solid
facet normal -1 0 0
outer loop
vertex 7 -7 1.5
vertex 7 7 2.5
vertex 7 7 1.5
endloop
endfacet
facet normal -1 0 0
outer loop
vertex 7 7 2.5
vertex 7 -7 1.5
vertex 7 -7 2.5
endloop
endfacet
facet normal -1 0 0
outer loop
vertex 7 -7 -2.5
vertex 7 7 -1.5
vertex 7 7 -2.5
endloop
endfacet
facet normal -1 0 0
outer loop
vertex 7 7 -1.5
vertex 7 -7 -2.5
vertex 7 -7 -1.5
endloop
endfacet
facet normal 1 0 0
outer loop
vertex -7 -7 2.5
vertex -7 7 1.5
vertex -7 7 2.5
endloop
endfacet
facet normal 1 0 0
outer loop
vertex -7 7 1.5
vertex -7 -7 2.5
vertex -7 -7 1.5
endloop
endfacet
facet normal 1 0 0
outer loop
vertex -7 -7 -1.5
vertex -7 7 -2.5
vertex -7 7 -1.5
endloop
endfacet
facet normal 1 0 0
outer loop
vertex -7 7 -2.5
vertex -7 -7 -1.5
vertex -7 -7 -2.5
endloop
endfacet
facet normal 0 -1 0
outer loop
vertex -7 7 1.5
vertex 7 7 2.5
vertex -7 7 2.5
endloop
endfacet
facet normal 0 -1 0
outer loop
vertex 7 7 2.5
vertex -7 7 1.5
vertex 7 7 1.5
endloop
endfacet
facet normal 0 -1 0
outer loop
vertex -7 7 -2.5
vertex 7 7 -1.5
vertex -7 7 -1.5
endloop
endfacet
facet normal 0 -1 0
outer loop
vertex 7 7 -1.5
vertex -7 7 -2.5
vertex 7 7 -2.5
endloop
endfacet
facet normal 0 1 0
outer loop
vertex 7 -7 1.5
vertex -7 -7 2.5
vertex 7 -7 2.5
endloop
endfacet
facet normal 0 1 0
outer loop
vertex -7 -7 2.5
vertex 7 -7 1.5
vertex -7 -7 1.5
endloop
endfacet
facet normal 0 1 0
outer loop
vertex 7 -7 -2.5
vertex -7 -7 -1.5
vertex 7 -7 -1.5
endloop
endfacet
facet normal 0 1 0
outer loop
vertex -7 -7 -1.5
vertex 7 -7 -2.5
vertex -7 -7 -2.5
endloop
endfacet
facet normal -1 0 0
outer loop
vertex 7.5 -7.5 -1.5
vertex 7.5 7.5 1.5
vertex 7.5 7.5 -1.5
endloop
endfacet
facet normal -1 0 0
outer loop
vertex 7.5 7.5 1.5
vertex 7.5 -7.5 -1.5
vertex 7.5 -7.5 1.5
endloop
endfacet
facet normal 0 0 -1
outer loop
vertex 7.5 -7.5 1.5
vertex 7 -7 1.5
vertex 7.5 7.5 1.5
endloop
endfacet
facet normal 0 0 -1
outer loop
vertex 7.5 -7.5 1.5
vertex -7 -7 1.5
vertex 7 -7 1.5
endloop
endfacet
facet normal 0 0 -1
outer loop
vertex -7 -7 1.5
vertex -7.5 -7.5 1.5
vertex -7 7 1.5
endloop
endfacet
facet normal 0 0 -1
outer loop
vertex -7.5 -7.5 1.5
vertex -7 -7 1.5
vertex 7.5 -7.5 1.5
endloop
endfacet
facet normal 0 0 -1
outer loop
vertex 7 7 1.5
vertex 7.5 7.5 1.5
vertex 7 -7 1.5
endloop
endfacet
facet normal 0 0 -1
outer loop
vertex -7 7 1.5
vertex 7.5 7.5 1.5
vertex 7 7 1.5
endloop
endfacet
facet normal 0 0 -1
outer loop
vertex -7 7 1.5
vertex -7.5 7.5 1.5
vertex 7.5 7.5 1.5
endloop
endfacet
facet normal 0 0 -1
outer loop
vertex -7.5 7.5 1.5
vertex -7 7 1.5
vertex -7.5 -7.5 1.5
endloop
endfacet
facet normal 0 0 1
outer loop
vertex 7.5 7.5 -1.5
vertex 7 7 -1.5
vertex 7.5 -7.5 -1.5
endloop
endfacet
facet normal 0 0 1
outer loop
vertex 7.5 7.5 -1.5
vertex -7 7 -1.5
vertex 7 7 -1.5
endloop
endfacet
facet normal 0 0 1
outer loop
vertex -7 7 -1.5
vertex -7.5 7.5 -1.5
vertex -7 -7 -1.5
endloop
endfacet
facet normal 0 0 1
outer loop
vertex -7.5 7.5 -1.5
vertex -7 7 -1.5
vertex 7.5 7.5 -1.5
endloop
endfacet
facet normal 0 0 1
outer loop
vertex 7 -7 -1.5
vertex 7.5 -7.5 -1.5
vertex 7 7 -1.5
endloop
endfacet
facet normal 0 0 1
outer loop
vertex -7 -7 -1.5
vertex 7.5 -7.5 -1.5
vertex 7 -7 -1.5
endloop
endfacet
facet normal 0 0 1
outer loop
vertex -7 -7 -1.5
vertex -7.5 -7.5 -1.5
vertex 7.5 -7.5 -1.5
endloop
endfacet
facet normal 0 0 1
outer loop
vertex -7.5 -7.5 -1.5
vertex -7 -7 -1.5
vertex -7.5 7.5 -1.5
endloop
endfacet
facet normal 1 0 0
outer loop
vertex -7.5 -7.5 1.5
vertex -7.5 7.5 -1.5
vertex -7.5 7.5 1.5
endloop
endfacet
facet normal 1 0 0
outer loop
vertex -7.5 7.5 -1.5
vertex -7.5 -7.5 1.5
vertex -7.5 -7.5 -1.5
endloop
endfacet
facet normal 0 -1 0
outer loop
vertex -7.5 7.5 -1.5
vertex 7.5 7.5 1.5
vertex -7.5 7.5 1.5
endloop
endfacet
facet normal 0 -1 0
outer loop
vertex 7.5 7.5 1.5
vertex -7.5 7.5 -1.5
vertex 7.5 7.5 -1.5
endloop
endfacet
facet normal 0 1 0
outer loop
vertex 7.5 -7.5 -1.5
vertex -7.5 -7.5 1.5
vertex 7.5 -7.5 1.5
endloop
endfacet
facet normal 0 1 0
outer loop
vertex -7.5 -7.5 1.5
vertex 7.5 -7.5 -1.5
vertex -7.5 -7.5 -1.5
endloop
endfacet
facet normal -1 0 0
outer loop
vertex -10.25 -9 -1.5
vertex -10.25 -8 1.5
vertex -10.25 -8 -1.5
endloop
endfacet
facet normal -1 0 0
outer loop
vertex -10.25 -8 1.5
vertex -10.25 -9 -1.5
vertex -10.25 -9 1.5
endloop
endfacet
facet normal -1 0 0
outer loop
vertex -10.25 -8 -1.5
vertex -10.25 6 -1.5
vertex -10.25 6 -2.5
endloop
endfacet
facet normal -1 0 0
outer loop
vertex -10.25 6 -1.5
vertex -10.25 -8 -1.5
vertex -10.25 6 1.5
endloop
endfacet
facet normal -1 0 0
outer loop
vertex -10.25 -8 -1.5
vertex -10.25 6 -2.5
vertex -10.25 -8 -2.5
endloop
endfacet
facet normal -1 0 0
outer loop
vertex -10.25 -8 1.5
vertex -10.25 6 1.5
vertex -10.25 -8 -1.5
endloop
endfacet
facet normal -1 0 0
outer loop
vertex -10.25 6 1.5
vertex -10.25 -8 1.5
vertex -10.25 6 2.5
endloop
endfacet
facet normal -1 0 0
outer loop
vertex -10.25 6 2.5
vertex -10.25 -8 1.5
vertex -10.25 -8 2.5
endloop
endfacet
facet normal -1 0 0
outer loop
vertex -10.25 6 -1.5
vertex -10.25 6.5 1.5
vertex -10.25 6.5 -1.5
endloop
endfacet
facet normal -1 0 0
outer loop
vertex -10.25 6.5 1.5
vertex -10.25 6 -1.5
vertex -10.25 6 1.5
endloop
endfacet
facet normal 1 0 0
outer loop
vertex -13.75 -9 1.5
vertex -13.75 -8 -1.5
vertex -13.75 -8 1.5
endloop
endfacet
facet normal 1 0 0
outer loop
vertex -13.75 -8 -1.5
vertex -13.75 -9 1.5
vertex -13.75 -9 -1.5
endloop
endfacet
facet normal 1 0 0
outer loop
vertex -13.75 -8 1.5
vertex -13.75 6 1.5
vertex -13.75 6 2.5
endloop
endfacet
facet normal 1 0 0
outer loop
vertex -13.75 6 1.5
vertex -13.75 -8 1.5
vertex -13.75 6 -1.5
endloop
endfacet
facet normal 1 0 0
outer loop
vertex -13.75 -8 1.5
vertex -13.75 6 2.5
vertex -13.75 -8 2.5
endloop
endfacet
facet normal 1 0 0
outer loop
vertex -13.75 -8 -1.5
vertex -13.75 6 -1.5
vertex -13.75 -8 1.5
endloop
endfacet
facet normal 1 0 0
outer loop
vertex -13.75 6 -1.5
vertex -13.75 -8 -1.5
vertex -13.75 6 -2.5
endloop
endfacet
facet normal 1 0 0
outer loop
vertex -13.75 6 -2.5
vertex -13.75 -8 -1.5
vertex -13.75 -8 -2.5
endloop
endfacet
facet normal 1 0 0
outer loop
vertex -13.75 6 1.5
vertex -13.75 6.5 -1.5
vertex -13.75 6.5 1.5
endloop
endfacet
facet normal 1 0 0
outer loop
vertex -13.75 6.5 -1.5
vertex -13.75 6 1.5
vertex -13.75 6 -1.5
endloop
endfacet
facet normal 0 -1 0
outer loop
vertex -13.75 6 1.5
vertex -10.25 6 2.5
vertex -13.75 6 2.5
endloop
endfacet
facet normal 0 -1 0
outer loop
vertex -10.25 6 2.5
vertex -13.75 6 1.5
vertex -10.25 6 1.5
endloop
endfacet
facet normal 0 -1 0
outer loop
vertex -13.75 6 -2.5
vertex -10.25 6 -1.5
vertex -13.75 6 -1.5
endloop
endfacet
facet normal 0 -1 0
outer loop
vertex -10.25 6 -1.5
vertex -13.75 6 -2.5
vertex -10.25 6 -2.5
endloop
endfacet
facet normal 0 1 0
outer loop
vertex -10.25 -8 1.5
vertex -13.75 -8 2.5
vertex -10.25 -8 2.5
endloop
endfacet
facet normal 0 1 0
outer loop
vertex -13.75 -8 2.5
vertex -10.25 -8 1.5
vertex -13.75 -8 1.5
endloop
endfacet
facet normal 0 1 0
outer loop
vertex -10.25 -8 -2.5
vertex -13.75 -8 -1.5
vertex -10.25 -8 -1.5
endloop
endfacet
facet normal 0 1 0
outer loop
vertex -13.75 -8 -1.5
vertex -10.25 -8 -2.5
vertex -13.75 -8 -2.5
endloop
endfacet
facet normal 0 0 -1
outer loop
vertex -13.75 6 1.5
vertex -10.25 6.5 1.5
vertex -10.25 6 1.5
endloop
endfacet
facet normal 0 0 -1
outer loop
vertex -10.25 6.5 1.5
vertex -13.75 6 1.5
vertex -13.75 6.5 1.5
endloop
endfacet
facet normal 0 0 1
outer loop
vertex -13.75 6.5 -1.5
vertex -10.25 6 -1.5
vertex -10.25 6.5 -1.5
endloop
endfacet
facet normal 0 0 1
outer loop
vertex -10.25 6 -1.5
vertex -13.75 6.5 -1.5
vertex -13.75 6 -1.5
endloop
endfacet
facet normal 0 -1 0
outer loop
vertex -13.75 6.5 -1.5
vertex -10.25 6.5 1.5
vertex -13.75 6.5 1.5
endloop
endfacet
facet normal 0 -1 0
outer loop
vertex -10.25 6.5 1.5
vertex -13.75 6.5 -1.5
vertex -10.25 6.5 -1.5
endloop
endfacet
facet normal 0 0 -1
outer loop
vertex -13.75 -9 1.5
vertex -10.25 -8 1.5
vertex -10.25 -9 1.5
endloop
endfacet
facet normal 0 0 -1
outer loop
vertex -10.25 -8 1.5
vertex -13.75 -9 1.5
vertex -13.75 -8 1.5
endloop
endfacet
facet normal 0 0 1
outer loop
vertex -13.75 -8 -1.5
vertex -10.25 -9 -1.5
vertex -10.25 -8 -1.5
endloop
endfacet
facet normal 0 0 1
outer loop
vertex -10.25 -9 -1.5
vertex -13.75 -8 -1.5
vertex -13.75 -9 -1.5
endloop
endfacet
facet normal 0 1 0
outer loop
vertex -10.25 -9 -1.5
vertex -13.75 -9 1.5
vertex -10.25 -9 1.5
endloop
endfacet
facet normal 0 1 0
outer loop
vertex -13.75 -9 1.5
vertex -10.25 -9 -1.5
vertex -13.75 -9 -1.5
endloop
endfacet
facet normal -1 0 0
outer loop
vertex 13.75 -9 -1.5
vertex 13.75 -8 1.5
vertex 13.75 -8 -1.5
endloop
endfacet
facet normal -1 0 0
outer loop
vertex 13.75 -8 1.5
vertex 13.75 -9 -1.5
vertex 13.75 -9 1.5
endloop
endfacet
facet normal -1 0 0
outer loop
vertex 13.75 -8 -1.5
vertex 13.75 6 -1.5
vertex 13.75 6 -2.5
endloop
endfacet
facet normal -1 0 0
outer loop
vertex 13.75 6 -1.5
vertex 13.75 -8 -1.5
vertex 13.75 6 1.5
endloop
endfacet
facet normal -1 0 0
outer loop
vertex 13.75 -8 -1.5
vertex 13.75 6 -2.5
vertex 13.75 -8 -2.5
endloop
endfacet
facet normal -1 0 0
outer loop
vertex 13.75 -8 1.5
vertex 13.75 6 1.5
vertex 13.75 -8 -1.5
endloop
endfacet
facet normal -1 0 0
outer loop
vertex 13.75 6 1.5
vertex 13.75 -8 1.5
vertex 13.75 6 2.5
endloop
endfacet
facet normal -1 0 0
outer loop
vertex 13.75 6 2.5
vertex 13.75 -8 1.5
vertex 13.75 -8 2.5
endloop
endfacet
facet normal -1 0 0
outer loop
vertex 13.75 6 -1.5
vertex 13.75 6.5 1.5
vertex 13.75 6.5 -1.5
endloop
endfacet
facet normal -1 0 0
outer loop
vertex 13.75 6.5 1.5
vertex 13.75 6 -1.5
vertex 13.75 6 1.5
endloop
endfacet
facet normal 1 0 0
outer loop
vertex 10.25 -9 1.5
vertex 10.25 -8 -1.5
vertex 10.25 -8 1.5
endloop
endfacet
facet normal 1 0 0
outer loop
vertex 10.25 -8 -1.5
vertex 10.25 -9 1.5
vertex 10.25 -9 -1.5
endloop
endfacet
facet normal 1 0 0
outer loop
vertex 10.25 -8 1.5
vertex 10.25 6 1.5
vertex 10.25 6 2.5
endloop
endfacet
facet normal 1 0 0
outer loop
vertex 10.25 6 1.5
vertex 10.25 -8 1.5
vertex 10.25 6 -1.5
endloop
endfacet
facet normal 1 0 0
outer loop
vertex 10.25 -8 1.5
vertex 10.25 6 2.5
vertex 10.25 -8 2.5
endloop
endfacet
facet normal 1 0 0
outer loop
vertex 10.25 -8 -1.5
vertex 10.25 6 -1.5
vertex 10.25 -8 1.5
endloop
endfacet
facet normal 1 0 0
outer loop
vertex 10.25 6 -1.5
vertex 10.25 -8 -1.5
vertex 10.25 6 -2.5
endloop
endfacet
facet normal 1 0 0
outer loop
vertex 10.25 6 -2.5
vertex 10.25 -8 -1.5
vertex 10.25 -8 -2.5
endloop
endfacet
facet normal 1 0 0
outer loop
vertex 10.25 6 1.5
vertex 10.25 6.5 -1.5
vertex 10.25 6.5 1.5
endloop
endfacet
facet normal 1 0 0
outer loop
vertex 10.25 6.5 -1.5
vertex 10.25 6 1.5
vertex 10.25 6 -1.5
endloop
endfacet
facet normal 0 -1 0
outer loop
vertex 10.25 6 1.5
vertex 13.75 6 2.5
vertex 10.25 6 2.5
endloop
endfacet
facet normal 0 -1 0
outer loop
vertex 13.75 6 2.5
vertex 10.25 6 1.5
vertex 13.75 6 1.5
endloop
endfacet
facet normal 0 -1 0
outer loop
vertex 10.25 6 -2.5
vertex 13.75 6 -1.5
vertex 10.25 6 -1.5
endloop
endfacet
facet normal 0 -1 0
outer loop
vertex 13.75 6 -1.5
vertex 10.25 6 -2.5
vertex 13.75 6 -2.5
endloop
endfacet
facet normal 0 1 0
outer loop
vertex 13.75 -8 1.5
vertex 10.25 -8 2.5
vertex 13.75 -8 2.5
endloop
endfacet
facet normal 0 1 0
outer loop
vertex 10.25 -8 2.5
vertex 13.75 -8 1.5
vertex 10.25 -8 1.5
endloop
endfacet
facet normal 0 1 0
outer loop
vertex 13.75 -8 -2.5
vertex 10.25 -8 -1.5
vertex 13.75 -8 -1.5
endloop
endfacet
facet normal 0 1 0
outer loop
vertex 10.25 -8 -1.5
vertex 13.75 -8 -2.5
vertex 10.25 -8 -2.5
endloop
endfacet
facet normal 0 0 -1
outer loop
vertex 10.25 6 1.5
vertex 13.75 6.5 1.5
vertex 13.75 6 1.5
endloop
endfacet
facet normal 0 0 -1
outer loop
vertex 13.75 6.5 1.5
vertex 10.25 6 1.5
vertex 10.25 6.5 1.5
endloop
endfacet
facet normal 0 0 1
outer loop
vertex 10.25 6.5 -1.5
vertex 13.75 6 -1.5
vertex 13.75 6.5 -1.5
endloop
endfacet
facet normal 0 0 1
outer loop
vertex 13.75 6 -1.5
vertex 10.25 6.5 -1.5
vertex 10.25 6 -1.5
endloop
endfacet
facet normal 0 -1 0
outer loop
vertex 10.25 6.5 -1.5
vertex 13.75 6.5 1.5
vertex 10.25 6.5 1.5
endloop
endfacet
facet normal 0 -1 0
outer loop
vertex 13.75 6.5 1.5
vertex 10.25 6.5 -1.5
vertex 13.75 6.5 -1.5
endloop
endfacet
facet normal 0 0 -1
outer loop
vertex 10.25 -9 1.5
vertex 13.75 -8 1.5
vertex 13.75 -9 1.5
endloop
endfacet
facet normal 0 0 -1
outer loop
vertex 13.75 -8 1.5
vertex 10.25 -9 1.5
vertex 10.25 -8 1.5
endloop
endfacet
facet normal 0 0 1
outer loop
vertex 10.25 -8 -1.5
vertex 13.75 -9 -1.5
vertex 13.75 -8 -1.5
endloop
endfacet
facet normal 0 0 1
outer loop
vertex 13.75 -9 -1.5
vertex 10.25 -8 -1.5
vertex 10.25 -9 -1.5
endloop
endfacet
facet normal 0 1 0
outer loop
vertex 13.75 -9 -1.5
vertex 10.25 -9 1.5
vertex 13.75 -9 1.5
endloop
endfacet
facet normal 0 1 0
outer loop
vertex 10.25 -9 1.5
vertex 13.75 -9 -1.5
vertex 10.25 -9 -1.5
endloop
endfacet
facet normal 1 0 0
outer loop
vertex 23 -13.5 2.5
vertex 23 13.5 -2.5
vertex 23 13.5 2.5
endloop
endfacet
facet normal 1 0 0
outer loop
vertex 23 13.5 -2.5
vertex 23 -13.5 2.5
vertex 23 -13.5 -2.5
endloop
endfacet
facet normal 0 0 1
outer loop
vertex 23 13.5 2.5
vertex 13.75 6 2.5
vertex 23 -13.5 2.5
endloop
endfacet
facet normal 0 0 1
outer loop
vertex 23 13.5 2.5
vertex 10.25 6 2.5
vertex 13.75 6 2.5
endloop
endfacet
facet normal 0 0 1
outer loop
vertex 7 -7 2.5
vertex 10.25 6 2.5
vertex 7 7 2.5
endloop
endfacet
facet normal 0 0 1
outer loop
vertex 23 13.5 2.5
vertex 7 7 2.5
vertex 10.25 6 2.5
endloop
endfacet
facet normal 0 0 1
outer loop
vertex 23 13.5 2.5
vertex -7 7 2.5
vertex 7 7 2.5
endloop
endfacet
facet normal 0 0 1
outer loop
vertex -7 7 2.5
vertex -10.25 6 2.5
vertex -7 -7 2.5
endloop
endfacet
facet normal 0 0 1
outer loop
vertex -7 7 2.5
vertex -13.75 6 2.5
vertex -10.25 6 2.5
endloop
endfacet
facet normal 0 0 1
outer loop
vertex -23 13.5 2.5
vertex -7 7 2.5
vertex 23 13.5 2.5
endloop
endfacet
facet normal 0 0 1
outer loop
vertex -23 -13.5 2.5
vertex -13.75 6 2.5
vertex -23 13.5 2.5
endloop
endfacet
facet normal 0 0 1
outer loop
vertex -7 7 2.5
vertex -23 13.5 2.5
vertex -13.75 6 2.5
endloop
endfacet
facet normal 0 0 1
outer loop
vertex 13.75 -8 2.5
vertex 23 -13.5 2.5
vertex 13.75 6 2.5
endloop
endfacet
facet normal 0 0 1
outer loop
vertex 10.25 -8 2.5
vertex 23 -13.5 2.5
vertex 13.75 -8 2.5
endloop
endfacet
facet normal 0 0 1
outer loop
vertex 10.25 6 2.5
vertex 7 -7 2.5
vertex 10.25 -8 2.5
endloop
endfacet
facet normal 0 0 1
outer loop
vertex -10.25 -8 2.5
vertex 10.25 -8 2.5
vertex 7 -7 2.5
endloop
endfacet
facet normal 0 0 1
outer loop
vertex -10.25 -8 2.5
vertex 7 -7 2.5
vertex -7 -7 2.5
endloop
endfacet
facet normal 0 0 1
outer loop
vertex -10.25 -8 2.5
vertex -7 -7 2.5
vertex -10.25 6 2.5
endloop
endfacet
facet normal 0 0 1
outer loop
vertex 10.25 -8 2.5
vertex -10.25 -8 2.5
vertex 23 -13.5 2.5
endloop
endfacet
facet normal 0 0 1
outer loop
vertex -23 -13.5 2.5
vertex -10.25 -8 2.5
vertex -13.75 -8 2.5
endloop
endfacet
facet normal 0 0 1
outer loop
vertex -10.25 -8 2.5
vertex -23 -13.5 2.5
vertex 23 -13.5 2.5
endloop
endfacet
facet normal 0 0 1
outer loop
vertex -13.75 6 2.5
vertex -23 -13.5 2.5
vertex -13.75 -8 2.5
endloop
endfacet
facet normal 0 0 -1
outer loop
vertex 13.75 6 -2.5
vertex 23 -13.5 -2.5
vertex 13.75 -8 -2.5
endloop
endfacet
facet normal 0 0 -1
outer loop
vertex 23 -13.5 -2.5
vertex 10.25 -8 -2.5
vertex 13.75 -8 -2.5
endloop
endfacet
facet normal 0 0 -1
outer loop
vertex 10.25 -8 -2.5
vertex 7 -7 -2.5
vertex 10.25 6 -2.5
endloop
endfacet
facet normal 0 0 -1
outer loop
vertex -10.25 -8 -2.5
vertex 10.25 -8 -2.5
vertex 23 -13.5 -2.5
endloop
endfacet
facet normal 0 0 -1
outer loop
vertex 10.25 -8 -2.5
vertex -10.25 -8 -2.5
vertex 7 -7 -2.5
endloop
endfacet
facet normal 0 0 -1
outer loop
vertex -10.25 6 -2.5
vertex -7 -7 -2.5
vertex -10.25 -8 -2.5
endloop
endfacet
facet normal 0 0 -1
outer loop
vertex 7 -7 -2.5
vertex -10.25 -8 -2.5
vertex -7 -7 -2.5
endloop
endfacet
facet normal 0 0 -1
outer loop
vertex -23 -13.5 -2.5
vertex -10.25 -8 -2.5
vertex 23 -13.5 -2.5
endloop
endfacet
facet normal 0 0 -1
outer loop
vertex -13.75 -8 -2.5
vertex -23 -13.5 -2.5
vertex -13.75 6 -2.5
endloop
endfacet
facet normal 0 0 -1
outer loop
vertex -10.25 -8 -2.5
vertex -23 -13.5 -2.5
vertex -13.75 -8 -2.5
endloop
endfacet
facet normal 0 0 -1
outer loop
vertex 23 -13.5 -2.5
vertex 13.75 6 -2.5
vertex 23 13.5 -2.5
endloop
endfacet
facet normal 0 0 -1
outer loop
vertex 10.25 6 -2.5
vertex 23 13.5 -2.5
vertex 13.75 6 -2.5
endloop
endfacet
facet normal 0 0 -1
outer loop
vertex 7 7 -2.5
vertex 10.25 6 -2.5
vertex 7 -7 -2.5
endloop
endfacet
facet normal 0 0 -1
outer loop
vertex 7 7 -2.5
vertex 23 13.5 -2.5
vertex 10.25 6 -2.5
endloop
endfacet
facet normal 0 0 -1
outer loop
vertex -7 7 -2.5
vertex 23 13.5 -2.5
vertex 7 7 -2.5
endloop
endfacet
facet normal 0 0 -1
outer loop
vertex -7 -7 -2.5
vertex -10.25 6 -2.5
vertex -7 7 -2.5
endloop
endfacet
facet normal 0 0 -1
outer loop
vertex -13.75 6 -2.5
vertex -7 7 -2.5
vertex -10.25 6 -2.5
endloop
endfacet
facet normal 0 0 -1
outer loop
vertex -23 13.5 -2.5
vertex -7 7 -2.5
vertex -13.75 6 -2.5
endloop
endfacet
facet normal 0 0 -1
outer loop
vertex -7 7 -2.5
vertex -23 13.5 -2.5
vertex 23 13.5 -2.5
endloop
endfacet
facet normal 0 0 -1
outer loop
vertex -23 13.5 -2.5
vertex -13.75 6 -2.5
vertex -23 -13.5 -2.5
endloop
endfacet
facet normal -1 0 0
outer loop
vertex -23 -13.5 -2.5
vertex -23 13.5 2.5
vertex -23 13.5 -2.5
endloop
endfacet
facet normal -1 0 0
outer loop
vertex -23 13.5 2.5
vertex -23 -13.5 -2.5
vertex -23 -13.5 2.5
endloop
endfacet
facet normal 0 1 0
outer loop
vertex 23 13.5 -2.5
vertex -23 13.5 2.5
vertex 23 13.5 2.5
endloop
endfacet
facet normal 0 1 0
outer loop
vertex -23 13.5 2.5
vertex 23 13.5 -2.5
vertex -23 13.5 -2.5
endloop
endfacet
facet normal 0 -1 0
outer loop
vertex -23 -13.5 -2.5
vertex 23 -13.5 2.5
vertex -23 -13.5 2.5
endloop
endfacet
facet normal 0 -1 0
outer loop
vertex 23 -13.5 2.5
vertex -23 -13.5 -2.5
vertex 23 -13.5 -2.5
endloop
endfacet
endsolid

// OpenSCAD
// file: common.scad
key_size = 14;
stabilizer_size = 3.5;

b_post = 8;
m_post_s = 2;
m_post_l = 10;
post_z = 15;

plat_z = 5;

module keyhole(x, y) {
  translate([x, y, 0]) {
    cube([key_size, key_size, plat_z + 1], center = true);
    cube([key_size + 1, key_size + 1, plat_z - 2], center = true);
  }
}

module double_wide(x, y) {
  keyhole(x, y);
  for (offset=[-12, 12]) {
     translate([x + offset, y - 1, 0]) {
       cube([stabilizer_size, key_size, plat_z + 1], center = true);
       translate([0, key_size/2, 0])
         cube([stabilizer_size, 1, plat_z - 2], center = true);
       translate([0, -key_size/2, 0])
         cube([stabilizer_size, 2, plat_z - 2], center = true);
     }
  }
}

module e_post(x, y, z) {
  translate([x, y, -(plat_z + post_z)/2]) {
    difference() {
      cube([b_post, b_post, post_z], center = true);
      translate([0, 0, -post_z/2]) cylinder(h=post_z, r=1.6, center=true, $fn=32);
    }
  }
}

module e_post_i(x, y, r) {
  translate([x, y, -(plat_z + post_z)/2]) {
    difference() {
      cube([b_post, b_post, post_z], center = true);
      translate([0, 0, post_z/6]) rotate(r) cylinder(h=b_post+1, r=2, center=true, $fn=32);
      translate([0, 0, -post_z/2]) cylinder(h=post_z, r=1.6, center=true, $fn=32);
    }
  }
}

module e_post_x(x, y) {
  e_post_i(x, y, [0, 90, 0]);
}


module e_post_y(x, y) {
  e_post_i(x, y, [90, 0, 0]);
}

module i_post_x(x, y) {
  translate([x, y, -(plat_z + post_z)/2]) cube([m_post_l, m_post_s, post_z], center = true);
}

module i_post_y(x, y) {
  translate([x, y, -(plat_z + post_z)/2]) cube([m_post_s, m_post_l, post_z], center = true);
}
// file: parameters.scad
key_size = 14;
key_sep = 5;
m_key_sep = 13.5;
l_key_sep = 33;

border = 8;
b_post = 8;
m_post_s = 2;
m_post_l = 10;
post_z = 15;

key_cell = key_size + key_sep;
m_key_cell_x = key_size + m_key_sep;
l_key_cell_x = 2*key_cell;

plat_z = 5;
// main file
include <parameters.scad>

plat_x = border + 2*key_cell;
plat_y = border + key_cell;

use <common.scad>

difference() {
    cube([plat_x, plat_y, 5], center = true);
    double_wide(0, 0);
}
